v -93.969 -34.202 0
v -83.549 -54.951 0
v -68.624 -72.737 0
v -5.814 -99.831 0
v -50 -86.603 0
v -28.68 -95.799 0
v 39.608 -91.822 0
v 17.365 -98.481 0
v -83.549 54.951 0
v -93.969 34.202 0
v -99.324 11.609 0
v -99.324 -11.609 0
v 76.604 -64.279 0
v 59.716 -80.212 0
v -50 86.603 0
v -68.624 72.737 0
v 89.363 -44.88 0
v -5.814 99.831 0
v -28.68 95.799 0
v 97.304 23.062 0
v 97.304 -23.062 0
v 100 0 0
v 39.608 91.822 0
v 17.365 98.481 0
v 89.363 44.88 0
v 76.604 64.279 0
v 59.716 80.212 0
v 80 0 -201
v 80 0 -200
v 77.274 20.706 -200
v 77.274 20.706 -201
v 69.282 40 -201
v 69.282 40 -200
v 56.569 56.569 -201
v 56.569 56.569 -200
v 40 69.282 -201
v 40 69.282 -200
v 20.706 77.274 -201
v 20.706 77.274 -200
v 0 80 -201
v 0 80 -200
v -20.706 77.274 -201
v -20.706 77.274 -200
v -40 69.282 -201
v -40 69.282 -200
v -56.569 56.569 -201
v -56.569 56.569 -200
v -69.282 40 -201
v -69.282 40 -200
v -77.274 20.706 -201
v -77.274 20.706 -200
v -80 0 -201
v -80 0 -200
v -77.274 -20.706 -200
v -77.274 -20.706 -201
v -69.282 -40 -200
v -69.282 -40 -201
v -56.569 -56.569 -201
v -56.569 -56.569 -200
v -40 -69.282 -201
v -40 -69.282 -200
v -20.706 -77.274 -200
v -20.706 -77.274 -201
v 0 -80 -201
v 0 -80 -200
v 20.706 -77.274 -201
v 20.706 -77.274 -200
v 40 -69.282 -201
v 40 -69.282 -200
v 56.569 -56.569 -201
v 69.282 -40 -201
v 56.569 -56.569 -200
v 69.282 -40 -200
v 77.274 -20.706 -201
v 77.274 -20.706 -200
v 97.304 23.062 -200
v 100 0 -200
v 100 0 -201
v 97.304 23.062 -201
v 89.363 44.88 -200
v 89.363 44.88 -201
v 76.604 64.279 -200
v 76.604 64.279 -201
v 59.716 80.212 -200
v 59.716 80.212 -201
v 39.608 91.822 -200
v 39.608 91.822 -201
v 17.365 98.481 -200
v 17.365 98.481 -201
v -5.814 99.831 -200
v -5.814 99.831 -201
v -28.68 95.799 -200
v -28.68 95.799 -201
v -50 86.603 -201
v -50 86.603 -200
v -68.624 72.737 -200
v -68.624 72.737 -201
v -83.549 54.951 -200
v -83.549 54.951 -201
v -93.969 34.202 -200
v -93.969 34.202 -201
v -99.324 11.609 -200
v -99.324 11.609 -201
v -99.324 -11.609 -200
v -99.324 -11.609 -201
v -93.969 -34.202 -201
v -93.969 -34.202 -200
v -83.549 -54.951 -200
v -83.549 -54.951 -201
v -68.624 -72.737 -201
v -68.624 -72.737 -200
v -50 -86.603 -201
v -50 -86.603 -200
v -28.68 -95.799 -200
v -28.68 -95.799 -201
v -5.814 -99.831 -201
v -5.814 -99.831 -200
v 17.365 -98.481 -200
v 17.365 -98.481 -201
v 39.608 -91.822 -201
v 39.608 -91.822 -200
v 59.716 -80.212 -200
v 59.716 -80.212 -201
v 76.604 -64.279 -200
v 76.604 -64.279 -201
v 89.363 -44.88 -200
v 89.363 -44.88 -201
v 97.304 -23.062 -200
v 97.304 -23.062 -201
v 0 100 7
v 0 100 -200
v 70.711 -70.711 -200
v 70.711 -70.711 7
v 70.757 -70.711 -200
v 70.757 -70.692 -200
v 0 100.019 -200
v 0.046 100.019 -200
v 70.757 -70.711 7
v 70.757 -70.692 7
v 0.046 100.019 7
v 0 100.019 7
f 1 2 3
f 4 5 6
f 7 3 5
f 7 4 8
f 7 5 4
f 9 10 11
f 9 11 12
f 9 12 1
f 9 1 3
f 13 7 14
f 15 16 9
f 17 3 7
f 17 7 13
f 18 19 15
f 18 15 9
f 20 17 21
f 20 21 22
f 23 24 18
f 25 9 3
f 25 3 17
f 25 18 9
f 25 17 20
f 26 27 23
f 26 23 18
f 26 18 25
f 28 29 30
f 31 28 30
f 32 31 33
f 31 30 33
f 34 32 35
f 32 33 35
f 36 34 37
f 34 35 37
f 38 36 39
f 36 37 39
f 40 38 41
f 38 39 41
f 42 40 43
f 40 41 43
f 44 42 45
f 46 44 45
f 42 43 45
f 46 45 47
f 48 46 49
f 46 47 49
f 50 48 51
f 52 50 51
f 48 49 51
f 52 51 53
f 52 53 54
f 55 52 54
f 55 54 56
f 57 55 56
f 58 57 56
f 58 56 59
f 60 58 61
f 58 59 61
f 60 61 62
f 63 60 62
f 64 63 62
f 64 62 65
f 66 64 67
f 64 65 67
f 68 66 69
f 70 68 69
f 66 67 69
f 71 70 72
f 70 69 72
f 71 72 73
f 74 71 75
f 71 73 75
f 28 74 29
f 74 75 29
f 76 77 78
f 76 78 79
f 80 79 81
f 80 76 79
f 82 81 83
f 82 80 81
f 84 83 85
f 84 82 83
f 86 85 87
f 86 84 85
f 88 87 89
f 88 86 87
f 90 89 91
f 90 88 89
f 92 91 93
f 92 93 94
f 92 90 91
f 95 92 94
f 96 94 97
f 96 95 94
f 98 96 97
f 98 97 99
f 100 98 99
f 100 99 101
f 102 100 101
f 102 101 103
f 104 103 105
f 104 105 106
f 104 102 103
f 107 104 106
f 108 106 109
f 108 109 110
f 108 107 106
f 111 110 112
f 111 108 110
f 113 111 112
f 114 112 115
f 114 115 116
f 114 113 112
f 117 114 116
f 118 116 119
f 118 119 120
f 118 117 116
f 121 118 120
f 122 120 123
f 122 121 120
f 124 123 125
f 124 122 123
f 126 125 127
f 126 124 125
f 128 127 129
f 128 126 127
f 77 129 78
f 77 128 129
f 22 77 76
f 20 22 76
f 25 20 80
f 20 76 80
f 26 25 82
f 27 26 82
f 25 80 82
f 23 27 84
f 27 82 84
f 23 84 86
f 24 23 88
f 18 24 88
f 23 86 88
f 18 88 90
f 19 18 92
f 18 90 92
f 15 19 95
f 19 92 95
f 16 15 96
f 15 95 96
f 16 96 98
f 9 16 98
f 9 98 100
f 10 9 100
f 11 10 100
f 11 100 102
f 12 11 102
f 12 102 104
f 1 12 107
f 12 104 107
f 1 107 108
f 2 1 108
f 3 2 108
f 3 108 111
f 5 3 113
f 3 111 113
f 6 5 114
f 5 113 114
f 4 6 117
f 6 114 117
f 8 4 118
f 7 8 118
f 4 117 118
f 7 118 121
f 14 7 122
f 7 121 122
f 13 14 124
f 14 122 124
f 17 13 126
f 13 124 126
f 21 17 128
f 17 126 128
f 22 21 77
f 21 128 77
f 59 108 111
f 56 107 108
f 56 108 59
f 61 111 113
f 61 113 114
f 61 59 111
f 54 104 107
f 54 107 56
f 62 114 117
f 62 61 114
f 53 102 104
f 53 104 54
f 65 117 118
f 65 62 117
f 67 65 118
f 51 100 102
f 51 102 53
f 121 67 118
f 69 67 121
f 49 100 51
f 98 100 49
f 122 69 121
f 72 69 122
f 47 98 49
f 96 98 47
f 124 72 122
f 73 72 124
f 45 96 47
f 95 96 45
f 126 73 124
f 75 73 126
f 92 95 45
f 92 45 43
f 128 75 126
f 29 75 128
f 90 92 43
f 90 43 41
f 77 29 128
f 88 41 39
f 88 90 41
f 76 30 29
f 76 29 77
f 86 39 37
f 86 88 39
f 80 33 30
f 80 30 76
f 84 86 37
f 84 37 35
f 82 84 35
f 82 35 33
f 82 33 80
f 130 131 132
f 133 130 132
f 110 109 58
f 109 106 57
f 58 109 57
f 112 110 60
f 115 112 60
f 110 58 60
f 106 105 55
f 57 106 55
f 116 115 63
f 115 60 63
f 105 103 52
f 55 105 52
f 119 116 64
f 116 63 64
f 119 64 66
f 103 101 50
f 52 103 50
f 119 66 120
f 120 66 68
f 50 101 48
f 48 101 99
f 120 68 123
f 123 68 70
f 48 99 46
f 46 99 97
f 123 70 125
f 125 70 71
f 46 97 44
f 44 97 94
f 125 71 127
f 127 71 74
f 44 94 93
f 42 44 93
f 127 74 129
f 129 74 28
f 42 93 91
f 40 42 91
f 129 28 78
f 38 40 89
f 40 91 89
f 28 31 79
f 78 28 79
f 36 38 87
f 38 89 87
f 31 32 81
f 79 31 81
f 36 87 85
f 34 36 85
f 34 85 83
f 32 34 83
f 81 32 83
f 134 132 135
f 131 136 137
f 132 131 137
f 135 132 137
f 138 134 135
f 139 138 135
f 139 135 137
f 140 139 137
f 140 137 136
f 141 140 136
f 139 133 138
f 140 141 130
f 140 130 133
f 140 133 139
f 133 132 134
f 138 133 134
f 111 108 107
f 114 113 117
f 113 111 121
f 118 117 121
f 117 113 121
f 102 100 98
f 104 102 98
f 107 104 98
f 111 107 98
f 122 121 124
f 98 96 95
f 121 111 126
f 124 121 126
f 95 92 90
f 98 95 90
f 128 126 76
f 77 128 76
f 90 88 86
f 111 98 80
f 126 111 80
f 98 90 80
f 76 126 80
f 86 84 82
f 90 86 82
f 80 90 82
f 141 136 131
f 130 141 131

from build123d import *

# Parameters (mm, degrees)
F4_DEPTH = 207
F2_R     = 100
F2_R_2   = 80
F6_DEPTH = 200
F7_DEPTH = 1


with BuildPart() as f4:
    # F3 (on offset) → F4 (new body)
    with BuildSketch(Plane.XY.offset(-200)):
        Polygon((0, 100.019134), (0, 100), (70.710678, -70.710678), (70.756872, -70.710678), (70.756872, -70.691544), (0.046194, 100.019134), align=None)
    extrude(amount=F4_DEPTH)


with BuildPart() as f6:
    # F2 (on offset) → F6 (new body)
    with BuildSketch(Plane.XY.offset(-200)):
        Circle(F2_R)
        Circle(F2_R_2, mode=Mode.SUBTRACT)
        Circle(F2_R_2)
    extrude(amount=F6_DEPTH)


with BuildPart() as f7:
    # F2 (on offset) → F7 (new body)
    with BuildSketch(Plane.XY.offset(-200)):
        Circle(F2_R)
        Circle(F2_R_2, mode=Mode.SUBTRACT)
    extrude(amount=-F7_DEPTH)


solid = Compound([f4.part, f6.part, f7.part])
